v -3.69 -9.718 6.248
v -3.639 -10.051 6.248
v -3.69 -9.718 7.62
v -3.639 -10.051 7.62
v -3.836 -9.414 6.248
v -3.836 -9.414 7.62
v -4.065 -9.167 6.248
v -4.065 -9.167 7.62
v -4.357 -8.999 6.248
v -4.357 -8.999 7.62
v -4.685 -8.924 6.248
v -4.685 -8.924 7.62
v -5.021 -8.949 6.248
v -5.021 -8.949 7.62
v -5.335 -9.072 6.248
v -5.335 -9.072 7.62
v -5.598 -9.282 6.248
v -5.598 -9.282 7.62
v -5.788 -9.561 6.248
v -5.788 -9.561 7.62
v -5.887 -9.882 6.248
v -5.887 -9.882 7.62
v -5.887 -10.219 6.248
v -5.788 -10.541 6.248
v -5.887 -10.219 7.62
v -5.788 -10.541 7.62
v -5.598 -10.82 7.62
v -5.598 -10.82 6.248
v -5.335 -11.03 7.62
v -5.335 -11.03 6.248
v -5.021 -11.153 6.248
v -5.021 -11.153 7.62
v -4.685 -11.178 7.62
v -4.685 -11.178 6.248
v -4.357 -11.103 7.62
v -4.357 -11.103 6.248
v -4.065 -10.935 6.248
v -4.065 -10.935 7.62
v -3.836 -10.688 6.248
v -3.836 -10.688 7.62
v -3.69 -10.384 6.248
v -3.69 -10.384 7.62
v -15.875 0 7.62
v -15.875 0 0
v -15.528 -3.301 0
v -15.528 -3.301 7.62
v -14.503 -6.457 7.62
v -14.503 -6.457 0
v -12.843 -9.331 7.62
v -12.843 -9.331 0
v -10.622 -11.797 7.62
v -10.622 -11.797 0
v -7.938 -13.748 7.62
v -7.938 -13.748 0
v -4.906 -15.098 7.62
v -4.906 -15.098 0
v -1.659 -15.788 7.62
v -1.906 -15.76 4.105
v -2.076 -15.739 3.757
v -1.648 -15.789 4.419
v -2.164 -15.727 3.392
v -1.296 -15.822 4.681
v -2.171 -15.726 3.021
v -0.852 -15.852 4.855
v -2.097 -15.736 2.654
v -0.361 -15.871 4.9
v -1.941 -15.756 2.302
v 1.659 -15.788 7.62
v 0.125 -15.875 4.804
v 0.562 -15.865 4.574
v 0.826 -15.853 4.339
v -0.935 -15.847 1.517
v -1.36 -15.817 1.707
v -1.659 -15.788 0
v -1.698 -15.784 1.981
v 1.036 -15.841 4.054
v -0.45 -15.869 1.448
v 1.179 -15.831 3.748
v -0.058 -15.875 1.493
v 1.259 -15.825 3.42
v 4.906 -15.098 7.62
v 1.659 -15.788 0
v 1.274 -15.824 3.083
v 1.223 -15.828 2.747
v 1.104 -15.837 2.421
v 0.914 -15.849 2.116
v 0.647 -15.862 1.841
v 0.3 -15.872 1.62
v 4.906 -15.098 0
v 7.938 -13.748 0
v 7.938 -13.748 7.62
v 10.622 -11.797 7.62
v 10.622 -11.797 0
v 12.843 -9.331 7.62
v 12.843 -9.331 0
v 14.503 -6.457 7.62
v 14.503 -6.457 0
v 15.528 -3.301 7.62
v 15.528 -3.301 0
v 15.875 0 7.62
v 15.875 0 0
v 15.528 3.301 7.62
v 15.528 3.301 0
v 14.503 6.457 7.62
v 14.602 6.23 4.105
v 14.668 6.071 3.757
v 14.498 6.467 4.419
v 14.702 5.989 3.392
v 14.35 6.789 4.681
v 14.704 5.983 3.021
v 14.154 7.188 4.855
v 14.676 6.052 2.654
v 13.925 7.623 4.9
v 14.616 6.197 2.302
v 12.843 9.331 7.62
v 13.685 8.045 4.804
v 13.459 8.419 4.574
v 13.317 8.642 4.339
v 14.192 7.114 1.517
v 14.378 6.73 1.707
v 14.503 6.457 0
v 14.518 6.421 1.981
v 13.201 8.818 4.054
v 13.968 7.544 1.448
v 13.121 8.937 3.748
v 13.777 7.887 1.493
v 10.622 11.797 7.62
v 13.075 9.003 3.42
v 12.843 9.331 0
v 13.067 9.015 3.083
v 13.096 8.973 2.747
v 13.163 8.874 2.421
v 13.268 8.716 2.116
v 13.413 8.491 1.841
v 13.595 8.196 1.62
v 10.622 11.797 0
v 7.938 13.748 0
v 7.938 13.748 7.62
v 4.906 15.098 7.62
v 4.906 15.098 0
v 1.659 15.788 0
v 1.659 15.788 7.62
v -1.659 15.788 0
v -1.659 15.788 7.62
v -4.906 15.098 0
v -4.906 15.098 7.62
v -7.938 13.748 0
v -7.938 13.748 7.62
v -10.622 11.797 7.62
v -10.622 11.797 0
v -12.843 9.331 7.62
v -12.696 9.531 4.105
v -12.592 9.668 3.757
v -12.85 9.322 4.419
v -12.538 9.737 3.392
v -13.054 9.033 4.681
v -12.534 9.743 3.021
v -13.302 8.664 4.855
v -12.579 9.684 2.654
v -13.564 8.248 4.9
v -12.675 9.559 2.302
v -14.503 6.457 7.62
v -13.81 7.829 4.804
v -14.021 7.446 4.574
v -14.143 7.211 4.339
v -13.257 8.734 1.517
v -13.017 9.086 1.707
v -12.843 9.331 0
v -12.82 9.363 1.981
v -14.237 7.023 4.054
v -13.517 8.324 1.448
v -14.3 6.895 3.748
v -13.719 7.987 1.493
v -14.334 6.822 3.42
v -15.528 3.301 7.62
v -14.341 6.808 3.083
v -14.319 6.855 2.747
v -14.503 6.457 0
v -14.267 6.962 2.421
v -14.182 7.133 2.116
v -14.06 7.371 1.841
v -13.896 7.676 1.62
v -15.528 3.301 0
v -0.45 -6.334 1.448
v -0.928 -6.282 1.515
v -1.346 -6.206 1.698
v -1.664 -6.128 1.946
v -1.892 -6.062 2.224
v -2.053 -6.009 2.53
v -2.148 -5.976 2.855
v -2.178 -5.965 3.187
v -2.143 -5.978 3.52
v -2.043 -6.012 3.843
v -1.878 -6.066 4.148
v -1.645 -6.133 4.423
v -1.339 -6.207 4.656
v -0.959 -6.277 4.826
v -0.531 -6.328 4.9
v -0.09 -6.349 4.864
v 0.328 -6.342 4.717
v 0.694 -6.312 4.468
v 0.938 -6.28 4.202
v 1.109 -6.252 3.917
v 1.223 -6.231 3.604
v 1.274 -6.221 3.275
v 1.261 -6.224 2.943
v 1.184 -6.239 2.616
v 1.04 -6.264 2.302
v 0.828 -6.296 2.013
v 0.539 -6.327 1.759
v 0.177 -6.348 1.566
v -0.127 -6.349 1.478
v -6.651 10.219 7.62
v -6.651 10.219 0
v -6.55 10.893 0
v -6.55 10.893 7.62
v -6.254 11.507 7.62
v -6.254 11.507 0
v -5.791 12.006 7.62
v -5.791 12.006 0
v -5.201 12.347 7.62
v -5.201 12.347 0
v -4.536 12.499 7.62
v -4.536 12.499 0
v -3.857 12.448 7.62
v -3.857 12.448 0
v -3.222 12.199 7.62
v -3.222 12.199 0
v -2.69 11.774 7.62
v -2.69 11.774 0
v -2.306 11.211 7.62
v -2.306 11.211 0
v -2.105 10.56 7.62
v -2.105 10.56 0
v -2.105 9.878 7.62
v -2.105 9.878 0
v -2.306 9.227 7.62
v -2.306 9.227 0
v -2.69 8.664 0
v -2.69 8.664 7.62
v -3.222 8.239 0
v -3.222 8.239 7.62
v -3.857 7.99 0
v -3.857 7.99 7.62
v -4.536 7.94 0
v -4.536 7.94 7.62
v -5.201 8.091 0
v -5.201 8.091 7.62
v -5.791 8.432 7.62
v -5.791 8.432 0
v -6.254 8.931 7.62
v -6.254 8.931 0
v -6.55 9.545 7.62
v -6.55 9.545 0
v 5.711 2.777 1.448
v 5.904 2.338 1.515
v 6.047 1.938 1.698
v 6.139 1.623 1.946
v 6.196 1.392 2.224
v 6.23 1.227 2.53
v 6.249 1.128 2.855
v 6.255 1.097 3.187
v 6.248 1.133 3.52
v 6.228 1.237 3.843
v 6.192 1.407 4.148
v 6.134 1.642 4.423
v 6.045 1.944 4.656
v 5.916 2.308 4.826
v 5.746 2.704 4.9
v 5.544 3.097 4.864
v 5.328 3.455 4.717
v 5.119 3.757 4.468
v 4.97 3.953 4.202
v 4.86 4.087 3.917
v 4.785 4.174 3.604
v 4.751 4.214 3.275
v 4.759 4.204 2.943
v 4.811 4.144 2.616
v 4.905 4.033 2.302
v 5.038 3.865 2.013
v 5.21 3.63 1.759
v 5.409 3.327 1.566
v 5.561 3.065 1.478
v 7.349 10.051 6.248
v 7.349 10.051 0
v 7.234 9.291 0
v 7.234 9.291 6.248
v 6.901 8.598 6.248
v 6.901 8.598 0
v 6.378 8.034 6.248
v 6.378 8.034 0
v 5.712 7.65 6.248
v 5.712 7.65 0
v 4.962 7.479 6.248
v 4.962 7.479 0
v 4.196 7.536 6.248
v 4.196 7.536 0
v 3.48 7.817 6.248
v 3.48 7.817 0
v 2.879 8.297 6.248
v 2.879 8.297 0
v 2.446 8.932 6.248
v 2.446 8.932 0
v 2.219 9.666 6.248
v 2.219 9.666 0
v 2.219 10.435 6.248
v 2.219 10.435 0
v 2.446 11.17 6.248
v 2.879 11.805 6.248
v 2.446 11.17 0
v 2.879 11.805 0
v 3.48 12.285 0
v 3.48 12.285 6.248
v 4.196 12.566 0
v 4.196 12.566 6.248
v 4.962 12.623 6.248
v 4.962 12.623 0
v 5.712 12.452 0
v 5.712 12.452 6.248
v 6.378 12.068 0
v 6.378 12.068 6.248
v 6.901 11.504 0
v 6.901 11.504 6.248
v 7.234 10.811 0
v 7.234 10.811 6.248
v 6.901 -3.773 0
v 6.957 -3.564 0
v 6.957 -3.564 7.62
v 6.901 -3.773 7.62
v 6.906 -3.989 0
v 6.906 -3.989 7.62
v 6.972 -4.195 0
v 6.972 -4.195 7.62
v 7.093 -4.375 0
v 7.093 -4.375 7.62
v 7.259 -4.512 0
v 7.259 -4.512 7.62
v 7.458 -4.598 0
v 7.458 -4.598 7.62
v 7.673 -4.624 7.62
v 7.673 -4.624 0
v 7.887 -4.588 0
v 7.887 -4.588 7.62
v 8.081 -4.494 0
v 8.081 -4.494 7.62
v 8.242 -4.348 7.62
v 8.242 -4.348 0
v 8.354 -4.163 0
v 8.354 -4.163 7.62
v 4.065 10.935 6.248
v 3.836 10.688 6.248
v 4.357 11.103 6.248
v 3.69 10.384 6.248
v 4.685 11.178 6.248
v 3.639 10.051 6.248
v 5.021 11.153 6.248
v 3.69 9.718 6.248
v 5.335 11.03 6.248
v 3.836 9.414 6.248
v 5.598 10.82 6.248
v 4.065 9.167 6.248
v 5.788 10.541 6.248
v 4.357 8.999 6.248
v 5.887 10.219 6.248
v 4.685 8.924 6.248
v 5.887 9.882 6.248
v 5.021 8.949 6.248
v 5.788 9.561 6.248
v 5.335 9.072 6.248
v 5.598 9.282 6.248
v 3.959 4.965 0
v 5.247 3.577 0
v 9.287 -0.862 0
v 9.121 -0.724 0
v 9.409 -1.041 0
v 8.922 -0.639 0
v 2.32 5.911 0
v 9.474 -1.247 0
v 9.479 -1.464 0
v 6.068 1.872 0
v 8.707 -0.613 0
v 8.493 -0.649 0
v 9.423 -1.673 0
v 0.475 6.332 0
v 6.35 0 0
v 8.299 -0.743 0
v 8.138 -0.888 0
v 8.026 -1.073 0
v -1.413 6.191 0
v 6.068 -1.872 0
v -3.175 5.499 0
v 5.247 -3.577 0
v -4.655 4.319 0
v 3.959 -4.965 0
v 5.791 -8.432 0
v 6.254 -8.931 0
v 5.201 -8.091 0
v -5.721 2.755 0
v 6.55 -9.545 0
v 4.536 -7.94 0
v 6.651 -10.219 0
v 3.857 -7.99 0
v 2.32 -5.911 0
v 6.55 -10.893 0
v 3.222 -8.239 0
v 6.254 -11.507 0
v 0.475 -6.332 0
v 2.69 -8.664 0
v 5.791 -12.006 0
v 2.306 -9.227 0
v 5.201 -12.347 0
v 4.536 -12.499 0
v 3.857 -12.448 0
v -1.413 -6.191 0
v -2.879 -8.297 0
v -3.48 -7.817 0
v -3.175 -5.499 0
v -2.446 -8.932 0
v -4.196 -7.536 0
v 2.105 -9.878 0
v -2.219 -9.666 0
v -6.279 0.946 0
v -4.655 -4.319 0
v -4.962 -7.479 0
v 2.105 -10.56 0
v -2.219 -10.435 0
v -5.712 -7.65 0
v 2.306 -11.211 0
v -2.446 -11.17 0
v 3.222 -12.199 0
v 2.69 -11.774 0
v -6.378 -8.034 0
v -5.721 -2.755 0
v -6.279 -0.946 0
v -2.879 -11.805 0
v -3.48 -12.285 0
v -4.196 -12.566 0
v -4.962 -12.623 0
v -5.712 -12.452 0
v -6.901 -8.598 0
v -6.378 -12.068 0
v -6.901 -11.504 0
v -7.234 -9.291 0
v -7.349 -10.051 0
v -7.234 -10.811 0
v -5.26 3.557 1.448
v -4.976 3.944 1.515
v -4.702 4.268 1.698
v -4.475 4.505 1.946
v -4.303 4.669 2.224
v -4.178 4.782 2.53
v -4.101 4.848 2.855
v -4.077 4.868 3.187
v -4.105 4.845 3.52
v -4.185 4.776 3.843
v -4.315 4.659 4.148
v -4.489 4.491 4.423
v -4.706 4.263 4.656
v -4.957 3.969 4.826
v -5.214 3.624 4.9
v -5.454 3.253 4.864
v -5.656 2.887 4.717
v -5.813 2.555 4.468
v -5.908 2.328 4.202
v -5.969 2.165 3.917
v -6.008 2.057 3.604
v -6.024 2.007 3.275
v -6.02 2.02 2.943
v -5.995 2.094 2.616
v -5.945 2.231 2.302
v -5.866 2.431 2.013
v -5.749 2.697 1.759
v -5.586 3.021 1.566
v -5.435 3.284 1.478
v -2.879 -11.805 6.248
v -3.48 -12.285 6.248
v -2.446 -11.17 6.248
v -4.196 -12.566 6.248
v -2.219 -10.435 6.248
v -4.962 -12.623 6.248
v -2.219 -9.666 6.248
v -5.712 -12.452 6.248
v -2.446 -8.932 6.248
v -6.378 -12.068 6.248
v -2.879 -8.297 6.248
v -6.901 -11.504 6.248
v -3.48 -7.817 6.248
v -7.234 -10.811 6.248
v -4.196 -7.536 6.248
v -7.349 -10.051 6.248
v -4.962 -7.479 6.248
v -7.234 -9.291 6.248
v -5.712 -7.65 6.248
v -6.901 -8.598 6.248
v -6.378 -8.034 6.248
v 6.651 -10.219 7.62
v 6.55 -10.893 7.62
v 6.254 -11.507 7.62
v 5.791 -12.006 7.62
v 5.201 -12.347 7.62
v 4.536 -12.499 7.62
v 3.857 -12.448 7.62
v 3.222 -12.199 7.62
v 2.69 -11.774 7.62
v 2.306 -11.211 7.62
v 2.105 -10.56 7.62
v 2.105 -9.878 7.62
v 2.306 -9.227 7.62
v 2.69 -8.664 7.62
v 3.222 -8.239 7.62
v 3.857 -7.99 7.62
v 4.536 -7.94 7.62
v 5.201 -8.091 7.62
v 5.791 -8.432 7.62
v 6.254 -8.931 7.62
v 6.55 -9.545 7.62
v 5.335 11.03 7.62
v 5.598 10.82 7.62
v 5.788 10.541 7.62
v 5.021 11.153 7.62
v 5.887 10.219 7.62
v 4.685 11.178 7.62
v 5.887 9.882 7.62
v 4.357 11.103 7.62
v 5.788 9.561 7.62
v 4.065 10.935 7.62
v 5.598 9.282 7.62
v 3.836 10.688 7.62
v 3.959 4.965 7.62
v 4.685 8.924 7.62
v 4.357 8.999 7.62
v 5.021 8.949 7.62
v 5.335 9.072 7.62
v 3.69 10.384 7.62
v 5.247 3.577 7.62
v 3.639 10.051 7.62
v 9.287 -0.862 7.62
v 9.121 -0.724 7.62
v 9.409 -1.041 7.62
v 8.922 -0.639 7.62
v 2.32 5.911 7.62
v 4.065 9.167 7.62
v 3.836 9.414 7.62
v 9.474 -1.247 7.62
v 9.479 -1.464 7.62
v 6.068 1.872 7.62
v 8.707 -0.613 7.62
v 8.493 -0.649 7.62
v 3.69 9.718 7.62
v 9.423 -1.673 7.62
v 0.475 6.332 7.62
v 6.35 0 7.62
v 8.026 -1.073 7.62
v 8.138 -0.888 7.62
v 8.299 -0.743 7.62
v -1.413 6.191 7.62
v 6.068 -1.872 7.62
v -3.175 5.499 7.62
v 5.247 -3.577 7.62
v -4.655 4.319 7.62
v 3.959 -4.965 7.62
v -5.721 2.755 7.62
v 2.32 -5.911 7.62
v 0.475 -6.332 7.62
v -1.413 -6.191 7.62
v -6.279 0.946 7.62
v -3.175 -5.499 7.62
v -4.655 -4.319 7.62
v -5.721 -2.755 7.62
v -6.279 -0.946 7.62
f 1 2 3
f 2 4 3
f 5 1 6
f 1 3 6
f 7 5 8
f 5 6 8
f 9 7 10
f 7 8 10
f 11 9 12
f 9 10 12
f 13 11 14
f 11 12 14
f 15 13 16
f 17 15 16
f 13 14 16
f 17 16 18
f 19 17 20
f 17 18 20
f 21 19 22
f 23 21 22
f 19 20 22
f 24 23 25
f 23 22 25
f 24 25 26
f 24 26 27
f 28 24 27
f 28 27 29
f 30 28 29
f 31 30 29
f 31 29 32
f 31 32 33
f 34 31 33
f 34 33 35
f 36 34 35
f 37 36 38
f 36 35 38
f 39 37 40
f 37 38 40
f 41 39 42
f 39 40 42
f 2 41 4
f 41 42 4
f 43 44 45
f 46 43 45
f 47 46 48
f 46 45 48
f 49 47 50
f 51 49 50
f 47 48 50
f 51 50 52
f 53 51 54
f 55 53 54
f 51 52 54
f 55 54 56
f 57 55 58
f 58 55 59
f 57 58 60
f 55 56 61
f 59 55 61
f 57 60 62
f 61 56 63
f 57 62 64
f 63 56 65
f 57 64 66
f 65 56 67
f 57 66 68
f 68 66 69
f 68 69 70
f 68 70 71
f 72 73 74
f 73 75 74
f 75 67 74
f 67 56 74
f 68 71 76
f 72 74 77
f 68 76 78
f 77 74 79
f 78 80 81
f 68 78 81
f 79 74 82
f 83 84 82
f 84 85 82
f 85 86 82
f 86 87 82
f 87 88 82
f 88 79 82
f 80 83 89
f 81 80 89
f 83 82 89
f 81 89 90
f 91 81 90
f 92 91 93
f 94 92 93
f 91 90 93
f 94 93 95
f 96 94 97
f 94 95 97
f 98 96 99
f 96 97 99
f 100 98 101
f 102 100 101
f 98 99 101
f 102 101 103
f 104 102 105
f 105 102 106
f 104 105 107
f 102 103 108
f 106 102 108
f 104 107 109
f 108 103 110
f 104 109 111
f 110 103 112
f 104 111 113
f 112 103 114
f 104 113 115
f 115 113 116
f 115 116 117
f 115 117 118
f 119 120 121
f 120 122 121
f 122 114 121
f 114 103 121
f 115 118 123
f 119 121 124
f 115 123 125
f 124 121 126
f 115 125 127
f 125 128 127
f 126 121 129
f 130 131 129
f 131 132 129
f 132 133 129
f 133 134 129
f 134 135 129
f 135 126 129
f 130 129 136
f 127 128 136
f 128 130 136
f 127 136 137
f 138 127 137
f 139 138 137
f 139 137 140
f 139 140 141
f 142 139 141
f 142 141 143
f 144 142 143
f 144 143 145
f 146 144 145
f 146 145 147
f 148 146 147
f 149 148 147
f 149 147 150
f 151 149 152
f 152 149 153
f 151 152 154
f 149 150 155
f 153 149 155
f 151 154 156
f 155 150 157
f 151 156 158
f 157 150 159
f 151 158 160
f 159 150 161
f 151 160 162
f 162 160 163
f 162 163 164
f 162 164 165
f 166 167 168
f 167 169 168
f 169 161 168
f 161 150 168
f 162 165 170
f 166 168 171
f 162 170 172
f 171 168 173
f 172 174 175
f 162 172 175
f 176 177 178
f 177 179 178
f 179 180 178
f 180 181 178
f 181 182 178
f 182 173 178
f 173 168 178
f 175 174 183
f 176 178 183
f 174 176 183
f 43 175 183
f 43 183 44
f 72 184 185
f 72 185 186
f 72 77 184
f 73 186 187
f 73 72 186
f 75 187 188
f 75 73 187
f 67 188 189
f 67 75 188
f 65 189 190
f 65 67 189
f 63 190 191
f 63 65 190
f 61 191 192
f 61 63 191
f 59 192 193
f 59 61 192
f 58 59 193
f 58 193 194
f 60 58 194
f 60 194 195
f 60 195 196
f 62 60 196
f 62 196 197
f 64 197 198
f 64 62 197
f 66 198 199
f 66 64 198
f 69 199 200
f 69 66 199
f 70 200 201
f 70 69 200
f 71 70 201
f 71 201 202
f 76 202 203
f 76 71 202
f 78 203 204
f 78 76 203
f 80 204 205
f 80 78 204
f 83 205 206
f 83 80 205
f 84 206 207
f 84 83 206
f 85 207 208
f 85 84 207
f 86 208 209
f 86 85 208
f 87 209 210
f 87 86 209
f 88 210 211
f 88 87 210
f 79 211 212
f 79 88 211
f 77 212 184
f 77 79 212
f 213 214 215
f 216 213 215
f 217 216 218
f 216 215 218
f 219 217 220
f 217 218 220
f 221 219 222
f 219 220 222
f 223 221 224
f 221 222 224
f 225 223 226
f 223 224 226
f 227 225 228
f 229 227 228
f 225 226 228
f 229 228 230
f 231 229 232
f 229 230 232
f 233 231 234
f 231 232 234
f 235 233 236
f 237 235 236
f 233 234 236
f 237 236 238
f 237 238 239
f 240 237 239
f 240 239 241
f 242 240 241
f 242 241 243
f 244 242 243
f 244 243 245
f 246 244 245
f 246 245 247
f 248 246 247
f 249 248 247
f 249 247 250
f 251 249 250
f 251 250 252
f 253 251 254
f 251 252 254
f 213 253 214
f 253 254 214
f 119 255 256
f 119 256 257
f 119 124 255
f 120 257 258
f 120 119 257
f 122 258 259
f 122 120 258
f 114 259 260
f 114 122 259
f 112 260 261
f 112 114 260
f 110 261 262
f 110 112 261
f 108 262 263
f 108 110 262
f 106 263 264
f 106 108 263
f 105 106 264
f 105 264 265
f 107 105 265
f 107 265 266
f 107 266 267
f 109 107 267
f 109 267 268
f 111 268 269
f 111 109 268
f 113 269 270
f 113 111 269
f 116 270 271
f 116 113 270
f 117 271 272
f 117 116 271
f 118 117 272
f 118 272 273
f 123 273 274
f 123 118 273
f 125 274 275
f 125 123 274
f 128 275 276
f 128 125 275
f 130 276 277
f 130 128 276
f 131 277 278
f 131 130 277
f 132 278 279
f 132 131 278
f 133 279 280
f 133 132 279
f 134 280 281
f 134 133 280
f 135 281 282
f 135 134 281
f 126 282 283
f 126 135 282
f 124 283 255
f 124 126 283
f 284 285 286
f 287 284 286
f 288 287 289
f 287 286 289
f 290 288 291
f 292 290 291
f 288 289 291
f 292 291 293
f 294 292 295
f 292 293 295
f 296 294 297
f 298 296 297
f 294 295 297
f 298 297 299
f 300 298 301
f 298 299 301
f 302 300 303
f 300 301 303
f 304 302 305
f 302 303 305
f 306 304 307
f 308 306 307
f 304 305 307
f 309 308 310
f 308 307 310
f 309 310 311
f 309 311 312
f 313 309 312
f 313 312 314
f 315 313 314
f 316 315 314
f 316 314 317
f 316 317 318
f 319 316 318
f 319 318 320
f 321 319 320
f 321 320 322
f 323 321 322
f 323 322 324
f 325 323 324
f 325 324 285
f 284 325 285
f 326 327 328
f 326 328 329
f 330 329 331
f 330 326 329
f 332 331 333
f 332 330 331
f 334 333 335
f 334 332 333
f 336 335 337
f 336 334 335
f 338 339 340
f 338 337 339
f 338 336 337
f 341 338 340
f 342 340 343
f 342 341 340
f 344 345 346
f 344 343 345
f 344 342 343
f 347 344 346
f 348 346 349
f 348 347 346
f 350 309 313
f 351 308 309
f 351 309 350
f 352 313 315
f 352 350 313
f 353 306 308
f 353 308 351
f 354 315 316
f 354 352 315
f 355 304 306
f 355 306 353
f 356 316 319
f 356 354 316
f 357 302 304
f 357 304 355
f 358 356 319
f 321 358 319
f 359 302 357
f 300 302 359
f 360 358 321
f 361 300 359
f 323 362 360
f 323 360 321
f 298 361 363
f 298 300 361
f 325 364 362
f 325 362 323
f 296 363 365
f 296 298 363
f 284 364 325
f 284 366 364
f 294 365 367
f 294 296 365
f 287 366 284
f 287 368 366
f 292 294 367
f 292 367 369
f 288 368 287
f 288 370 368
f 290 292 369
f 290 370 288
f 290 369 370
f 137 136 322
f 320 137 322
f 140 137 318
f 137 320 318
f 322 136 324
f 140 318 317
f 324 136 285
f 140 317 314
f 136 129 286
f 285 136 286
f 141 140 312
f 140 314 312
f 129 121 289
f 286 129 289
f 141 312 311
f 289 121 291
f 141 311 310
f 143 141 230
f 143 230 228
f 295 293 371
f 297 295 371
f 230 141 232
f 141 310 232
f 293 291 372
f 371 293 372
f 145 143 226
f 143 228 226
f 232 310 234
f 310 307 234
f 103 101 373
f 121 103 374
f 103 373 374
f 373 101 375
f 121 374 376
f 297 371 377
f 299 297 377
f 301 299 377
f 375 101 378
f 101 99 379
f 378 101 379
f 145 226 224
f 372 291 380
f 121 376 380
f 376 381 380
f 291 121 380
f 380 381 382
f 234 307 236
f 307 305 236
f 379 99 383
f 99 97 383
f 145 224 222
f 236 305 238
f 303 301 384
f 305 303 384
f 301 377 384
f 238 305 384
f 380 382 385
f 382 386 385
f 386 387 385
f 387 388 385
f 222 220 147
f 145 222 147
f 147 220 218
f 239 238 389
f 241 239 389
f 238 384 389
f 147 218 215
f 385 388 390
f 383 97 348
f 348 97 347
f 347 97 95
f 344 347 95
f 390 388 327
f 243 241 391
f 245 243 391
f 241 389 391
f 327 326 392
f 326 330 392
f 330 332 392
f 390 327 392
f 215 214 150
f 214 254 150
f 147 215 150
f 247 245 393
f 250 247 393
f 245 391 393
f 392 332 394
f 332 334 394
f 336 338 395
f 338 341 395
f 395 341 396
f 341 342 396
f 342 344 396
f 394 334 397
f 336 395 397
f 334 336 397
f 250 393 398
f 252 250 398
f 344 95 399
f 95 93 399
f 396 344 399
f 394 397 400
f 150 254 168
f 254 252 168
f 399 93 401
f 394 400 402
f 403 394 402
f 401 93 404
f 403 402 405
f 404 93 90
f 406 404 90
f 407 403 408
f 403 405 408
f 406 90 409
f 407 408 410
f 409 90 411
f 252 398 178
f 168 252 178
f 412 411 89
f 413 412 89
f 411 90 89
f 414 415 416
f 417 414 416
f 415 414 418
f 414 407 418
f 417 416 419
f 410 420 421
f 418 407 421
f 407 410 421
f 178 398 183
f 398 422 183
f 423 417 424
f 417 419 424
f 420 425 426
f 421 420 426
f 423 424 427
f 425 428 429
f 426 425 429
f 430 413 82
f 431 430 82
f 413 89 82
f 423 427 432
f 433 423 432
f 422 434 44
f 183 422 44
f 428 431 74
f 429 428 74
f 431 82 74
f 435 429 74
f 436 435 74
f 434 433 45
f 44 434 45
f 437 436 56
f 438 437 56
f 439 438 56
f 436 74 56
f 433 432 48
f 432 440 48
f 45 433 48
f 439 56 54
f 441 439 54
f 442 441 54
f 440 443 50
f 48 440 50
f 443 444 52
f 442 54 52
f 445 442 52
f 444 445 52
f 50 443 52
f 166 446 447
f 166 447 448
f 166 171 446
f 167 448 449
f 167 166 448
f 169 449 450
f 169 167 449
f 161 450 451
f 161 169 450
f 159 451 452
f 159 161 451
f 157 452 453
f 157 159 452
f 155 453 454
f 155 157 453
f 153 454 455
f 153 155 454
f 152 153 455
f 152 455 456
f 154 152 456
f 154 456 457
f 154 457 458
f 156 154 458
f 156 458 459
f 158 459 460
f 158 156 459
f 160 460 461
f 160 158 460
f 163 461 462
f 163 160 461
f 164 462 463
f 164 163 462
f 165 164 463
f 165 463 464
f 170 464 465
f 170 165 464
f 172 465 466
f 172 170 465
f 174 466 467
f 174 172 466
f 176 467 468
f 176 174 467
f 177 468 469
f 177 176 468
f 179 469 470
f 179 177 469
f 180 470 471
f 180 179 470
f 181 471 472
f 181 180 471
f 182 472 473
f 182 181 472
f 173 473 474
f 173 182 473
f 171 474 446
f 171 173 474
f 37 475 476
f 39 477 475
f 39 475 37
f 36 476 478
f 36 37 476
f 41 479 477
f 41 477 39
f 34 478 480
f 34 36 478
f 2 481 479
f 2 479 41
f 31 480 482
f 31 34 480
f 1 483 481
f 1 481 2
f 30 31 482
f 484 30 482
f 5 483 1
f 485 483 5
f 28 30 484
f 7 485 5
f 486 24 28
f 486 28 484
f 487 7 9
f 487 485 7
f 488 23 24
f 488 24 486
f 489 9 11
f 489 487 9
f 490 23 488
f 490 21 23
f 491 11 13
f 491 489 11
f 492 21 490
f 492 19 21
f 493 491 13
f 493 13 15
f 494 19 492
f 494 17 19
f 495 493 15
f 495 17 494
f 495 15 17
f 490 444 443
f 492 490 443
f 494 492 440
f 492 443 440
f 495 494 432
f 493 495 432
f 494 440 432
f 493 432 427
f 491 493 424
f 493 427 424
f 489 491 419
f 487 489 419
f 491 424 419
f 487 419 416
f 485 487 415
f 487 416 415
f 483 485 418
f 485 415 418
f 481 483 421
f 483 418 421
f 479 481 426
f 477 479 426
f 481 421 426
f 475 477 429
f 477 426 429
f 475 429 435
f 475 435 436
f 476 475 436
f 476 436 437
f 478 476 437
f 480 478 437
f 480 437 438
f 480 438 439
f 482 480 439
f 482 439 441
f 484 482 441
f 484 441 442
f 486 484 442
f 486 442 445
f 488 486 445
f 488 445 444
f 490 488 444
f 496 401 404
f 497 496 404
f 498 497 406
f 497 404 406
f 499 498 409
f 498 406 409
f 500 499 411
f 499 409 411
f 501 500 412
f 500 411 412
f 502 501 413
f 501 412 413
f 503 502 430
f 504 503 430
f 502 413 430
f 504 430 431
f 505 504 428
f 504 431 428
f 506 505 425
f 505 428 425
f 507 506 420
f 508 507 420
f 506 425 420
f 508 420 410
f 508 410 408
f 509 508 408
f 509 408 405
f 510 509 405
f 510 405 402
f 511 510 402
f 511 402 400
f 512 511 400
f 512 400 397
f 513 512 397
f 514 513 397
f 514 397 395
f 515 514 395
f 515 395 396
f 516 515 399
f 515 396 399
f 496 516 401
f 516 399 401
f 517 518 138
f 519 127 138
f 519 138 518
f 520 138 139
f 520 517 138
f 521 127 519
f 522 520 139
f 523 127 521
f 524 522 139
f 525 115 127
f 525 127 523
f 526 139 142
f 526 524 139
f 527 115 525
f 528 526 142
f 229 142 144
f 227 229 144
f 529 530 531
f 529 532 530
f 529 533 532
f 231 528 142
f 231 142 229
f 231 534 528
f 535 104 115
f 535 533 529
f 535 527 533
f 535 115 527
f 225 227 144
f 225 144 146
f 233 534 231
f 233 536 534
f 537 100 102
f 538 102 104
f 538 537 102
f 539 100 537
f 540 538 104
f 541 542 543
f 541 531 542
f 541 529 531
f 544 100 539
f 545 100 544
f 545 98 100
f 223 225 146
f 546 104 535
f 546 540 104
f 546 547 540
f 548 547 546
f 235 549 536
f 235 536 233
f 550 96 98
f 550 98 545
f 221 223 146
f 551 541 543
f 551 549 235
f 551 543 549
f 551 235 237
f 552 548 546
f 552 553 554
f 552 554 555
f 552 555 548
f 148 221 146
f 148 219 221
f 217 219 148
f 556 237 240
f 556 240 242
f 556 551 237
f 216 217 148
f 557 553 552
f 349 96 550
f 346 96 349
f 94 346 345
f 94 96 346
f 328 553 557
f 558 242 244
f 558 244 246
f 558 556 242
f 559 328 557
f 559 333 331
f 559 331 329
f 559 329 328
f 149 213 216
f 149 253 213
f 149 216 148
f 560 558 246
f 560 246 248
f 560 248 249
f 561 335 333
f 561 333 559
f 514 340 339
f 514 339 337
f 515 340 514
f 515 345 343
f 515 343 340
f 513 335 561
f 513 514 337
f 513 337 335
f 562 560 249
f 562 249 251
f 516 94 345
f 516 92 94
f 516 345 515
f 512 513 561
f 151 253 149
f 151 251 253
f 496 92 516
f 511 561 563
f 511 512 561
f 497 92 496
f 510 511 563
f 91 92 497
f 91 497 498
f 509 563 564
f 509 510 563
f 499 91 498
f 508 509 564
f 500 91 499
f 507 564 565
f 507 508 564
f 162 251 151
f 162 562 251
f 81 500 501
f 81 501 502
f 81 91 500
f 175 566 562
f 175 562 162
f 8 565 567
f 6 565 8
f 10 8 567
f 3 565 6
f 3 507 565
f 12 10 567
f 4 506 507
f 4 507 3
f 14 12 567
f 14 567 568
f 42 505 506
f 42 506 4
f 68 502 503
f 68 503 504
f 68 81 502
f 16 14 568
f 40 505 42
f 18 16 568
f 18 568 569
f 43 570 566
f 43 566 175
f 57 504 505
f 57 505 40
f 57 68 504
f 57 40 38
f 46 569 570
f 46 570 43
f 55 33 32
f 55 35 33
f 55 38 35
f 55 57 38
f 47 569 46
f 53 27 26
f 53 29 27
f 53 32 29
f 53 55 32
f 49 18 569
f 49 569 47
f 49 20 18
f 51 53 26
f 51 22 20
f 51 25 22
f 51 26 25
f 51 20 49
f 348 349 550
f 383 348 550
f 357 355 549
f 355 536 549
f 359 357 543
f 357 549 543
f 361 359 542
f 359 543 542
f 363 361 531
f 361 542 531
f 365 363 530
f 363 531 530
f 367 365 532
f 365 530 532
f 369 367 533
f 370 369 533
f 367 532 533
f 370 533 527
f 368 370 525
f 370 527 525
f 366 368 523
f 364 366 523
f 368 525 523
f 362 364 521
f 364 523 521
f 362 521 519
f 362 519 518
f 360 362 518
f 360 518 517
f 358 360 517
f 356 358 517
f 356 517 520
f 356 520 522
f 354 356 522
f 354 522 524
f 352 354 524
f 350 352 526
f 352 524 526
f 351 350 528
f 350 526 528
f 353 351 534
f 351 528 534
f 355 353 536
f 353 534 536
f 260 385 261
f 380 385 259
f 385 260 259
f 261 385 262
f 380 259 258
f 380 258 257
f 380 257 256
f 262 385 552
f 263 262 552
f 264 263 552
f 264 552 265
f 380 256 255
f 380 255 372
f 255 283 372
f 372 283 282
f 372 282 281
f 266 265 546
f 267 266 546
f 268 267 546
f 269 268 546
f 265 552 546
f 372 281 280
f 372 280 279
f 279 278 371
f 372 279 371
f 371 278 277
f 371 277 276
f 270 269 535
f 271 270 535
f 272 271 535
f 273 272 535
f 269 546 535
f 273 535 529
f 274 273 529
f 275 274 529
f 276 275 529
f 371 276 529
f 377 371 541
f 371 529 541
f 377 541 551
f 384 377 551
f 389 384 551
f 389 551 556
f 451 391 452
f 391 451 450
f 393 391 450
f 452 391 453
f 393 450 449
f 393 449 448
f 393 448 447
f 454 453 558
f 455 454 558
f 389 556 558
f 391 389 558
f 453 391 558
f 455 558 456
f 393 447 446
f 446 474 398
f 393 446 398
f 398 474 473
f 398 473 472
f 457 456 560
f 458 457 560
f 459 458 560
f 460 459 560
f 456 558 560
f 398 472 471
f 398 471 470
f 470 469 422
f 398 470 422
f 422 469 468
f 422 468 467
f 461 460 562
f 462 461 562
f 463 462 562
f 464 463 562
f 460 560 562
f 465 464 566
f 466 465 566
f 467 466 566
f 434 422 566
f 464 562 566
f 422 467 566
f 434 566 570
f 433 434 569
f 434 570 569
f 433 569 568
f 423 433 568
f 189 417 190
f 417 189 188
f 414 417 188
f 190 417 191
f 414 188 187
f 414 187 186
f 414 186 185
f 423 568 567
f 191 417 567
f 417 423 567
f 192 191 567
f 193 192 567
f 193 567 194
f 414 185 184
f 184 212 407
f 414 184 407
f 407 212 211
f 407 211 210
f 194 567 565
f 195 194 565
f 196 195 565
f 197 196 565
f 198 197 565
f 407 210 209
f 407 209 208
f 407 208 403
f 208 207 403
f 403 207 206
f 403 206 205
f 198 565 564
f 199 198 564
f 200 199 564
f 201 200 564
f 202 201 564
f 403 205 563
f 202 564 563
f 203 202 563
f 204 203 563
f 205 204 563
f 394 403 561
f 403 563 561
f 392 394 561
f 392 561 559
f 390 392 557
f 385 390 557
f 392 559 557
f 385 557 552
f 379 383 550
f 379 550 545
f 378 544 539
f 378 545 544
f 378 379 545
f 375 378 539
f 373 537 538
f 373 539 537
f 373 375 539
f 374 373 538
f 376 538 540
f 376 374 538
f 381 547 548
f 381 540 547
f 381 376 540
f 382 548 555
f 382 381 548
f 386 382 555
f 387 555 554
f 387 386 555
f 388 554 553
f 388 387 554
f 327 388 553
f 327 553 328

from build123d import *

# Parameters (mm, degrees)
SKETCH1_R                                      = 15.875
BOSS_EXTRUDE1_DEPTH                            = 7.62
SKETCH2_R                                      = 6.35
CUT_EXTRUDE1_DEPTH                             = 24.708556472
CIRPATTERN1_COUNT                              = 3
CBORE_FOR_2_BUTTON_HEAD_CAP_SCREW1_D           = 2.2606
CBORE_FOR_2_BUTTON_HEAD_CAP_SCREW1_CBORE_D     = 5.15874
CBORE_FOR_2_BUTTON_HEAD_CAP_SCREW1_CBORE_DEPTH = 6.2484
CIRPATTERN2_COUNT                              = 2
SKETCH42_R                                     = 2.286
CUT_EXTRUDE2_DEPTH                             = 7.62
CIRPATTERN3_COUNT                              = 2
CUT_EXTRUDE3_DEPTH                             = 24.70855664


with BuildPart() as part:
    # Sketch1 → Boss-Extrude1 (new body)
    with BuildSketch(Plane.XY):
        with Locations(Location((0, 0, 0), (0, 0, 180))):
            Circle(SKETCH1_R)
    extrude(amount=BOSS_EXTRUDE1_DEPTH)

    # Sketch2 → Cut-Extrude1 (cut, through all)
    with BuildSketch(Plane.XY.offset(7.62)):
        Circle(SKETCH2_R)
    extrude(amount=-CUT_EXTRUDE1_DEPTH, mode=Mode.SUBTRACT)

    # Sketch36 → Tap Drill for #8-32 Tap1 (revolve, cut)
    with BuildSketch(Plane(origin=(-0.450397279, -15.875, 3.175), x_dir=(0, 0, -1), z_dir=(1, 0, 0))):
        Polygon((0, 0), (0, 20.499292883), (1.7272, 19.05), (1.7272, 0), align=None)
    tap_drill_for_8_32_tap1 = revolve(axis=Axis((-0.450397279, -22.225, 3.175), (0, 1, 0)), mode=Mode.SUBTRACT)

    # CirPattern1: Tap Drill for #8-32 Tap1 ×3 about axis
    cirpattern1_axis = Axis((0, 0, 7.62), (0, 0, -1))
    for i in range(1, CIRPATTERN1_COUNT):
        add(tap_drill_for_8_32_tap1.rotate(cirpattern1_axis, i * 360 / CIRPATTERN1_COUNT), mode=Mode.SUBTRACT)

    # CBORE for #2 Button Head Cap Screw1 (through all)
    with Locations(Plane(origin=(0, 0, 0), x_dir=(-1, 0, 0), z_dir=(0, 0, -1))):
        with Locations((4.769587089, -10.050926029)):
            cbore_for_2_button_head_cap_screw1 = CounterBoreHole(CBORE_FOR_2_BUTTON_HEAD_CAP_SCREW1_D / 2, CBORE_FOR_2_BUTTON_HEAD_CAP_SCREW1_CBORE_D / 2, CBORE_FOR_2_BUTTON_HEAD_CAP_SCREW1_CBORE_DEPTH)

    # CirPattern2: CBORE for #2 Button Head Cap Screw1 ×2 about axis
    cirpattern2_axis = Axis((0, 0, 0), (0, 0, 1))
    for i in range(1, CIRPATTERN2_COUNT):
        add(cbore_for_2_button_head_cap_screw1.rotate(cirpattern2_axis, i * 360 / CIRPATTERN2_COUNT), mode=Mode.SUBTRACT)

    # Sketch42 → Cut-Extrude2 (cut)
    with BuildSketch(Plane(origin=(0, 0, 0), x_dir=(-1, 0, 0), z_dir=(0, 0, -1))):
        with Locations((4.365368762, 10.219159056)):
            Circle(SKETCH42_R)
    cut_extrude2 = extrude(amount=-CUT_EXTRUDE2_DEPTH, mode=Mode.SUBTRACT)

    # CirPattern3: Cut-Extrude2 ×2 about axis
    cirpattern3_axis = Axis((0, 0, 0), (0, 0, 1))
    for i in range(1, CIRPATTERN3_COUNT):
        add(cut_extrude2.rotate(cirpattern3_axis, i * 360 / CIRPATTERN3_COUNT), mode=Mode.SUBTRACT)

    # Sketch43 → Cut-Extrude3 (cut, through all)
    with BuildSketch(Plane(origin=(0, 0, 0), x_dir=(-1, 0, 0), z_dir=(0, 0, -1))):
        with BuildLine():
            Line((-8.025711128, -1.073137194), (-6.956985206, -3.563699487))
            ThreePointArc((-6.956985206, -3.563699487), (-7.355887027, -4.562271884), (-8.354459424, -4.163370063))
            Line((-8.354459424, -4.163370063), (-9.423185347, -1.67280777))
            ThreePointArc((-9.423185347, -1.67280777), (-9.024283525, -0.674235373), (-8.025711128, -1.073137194))
        make_face()
    extrude(amount=-CUT_EXTRUDE3_DEPTH, mode=Mode.SUBTRACT)


solid = part.part
